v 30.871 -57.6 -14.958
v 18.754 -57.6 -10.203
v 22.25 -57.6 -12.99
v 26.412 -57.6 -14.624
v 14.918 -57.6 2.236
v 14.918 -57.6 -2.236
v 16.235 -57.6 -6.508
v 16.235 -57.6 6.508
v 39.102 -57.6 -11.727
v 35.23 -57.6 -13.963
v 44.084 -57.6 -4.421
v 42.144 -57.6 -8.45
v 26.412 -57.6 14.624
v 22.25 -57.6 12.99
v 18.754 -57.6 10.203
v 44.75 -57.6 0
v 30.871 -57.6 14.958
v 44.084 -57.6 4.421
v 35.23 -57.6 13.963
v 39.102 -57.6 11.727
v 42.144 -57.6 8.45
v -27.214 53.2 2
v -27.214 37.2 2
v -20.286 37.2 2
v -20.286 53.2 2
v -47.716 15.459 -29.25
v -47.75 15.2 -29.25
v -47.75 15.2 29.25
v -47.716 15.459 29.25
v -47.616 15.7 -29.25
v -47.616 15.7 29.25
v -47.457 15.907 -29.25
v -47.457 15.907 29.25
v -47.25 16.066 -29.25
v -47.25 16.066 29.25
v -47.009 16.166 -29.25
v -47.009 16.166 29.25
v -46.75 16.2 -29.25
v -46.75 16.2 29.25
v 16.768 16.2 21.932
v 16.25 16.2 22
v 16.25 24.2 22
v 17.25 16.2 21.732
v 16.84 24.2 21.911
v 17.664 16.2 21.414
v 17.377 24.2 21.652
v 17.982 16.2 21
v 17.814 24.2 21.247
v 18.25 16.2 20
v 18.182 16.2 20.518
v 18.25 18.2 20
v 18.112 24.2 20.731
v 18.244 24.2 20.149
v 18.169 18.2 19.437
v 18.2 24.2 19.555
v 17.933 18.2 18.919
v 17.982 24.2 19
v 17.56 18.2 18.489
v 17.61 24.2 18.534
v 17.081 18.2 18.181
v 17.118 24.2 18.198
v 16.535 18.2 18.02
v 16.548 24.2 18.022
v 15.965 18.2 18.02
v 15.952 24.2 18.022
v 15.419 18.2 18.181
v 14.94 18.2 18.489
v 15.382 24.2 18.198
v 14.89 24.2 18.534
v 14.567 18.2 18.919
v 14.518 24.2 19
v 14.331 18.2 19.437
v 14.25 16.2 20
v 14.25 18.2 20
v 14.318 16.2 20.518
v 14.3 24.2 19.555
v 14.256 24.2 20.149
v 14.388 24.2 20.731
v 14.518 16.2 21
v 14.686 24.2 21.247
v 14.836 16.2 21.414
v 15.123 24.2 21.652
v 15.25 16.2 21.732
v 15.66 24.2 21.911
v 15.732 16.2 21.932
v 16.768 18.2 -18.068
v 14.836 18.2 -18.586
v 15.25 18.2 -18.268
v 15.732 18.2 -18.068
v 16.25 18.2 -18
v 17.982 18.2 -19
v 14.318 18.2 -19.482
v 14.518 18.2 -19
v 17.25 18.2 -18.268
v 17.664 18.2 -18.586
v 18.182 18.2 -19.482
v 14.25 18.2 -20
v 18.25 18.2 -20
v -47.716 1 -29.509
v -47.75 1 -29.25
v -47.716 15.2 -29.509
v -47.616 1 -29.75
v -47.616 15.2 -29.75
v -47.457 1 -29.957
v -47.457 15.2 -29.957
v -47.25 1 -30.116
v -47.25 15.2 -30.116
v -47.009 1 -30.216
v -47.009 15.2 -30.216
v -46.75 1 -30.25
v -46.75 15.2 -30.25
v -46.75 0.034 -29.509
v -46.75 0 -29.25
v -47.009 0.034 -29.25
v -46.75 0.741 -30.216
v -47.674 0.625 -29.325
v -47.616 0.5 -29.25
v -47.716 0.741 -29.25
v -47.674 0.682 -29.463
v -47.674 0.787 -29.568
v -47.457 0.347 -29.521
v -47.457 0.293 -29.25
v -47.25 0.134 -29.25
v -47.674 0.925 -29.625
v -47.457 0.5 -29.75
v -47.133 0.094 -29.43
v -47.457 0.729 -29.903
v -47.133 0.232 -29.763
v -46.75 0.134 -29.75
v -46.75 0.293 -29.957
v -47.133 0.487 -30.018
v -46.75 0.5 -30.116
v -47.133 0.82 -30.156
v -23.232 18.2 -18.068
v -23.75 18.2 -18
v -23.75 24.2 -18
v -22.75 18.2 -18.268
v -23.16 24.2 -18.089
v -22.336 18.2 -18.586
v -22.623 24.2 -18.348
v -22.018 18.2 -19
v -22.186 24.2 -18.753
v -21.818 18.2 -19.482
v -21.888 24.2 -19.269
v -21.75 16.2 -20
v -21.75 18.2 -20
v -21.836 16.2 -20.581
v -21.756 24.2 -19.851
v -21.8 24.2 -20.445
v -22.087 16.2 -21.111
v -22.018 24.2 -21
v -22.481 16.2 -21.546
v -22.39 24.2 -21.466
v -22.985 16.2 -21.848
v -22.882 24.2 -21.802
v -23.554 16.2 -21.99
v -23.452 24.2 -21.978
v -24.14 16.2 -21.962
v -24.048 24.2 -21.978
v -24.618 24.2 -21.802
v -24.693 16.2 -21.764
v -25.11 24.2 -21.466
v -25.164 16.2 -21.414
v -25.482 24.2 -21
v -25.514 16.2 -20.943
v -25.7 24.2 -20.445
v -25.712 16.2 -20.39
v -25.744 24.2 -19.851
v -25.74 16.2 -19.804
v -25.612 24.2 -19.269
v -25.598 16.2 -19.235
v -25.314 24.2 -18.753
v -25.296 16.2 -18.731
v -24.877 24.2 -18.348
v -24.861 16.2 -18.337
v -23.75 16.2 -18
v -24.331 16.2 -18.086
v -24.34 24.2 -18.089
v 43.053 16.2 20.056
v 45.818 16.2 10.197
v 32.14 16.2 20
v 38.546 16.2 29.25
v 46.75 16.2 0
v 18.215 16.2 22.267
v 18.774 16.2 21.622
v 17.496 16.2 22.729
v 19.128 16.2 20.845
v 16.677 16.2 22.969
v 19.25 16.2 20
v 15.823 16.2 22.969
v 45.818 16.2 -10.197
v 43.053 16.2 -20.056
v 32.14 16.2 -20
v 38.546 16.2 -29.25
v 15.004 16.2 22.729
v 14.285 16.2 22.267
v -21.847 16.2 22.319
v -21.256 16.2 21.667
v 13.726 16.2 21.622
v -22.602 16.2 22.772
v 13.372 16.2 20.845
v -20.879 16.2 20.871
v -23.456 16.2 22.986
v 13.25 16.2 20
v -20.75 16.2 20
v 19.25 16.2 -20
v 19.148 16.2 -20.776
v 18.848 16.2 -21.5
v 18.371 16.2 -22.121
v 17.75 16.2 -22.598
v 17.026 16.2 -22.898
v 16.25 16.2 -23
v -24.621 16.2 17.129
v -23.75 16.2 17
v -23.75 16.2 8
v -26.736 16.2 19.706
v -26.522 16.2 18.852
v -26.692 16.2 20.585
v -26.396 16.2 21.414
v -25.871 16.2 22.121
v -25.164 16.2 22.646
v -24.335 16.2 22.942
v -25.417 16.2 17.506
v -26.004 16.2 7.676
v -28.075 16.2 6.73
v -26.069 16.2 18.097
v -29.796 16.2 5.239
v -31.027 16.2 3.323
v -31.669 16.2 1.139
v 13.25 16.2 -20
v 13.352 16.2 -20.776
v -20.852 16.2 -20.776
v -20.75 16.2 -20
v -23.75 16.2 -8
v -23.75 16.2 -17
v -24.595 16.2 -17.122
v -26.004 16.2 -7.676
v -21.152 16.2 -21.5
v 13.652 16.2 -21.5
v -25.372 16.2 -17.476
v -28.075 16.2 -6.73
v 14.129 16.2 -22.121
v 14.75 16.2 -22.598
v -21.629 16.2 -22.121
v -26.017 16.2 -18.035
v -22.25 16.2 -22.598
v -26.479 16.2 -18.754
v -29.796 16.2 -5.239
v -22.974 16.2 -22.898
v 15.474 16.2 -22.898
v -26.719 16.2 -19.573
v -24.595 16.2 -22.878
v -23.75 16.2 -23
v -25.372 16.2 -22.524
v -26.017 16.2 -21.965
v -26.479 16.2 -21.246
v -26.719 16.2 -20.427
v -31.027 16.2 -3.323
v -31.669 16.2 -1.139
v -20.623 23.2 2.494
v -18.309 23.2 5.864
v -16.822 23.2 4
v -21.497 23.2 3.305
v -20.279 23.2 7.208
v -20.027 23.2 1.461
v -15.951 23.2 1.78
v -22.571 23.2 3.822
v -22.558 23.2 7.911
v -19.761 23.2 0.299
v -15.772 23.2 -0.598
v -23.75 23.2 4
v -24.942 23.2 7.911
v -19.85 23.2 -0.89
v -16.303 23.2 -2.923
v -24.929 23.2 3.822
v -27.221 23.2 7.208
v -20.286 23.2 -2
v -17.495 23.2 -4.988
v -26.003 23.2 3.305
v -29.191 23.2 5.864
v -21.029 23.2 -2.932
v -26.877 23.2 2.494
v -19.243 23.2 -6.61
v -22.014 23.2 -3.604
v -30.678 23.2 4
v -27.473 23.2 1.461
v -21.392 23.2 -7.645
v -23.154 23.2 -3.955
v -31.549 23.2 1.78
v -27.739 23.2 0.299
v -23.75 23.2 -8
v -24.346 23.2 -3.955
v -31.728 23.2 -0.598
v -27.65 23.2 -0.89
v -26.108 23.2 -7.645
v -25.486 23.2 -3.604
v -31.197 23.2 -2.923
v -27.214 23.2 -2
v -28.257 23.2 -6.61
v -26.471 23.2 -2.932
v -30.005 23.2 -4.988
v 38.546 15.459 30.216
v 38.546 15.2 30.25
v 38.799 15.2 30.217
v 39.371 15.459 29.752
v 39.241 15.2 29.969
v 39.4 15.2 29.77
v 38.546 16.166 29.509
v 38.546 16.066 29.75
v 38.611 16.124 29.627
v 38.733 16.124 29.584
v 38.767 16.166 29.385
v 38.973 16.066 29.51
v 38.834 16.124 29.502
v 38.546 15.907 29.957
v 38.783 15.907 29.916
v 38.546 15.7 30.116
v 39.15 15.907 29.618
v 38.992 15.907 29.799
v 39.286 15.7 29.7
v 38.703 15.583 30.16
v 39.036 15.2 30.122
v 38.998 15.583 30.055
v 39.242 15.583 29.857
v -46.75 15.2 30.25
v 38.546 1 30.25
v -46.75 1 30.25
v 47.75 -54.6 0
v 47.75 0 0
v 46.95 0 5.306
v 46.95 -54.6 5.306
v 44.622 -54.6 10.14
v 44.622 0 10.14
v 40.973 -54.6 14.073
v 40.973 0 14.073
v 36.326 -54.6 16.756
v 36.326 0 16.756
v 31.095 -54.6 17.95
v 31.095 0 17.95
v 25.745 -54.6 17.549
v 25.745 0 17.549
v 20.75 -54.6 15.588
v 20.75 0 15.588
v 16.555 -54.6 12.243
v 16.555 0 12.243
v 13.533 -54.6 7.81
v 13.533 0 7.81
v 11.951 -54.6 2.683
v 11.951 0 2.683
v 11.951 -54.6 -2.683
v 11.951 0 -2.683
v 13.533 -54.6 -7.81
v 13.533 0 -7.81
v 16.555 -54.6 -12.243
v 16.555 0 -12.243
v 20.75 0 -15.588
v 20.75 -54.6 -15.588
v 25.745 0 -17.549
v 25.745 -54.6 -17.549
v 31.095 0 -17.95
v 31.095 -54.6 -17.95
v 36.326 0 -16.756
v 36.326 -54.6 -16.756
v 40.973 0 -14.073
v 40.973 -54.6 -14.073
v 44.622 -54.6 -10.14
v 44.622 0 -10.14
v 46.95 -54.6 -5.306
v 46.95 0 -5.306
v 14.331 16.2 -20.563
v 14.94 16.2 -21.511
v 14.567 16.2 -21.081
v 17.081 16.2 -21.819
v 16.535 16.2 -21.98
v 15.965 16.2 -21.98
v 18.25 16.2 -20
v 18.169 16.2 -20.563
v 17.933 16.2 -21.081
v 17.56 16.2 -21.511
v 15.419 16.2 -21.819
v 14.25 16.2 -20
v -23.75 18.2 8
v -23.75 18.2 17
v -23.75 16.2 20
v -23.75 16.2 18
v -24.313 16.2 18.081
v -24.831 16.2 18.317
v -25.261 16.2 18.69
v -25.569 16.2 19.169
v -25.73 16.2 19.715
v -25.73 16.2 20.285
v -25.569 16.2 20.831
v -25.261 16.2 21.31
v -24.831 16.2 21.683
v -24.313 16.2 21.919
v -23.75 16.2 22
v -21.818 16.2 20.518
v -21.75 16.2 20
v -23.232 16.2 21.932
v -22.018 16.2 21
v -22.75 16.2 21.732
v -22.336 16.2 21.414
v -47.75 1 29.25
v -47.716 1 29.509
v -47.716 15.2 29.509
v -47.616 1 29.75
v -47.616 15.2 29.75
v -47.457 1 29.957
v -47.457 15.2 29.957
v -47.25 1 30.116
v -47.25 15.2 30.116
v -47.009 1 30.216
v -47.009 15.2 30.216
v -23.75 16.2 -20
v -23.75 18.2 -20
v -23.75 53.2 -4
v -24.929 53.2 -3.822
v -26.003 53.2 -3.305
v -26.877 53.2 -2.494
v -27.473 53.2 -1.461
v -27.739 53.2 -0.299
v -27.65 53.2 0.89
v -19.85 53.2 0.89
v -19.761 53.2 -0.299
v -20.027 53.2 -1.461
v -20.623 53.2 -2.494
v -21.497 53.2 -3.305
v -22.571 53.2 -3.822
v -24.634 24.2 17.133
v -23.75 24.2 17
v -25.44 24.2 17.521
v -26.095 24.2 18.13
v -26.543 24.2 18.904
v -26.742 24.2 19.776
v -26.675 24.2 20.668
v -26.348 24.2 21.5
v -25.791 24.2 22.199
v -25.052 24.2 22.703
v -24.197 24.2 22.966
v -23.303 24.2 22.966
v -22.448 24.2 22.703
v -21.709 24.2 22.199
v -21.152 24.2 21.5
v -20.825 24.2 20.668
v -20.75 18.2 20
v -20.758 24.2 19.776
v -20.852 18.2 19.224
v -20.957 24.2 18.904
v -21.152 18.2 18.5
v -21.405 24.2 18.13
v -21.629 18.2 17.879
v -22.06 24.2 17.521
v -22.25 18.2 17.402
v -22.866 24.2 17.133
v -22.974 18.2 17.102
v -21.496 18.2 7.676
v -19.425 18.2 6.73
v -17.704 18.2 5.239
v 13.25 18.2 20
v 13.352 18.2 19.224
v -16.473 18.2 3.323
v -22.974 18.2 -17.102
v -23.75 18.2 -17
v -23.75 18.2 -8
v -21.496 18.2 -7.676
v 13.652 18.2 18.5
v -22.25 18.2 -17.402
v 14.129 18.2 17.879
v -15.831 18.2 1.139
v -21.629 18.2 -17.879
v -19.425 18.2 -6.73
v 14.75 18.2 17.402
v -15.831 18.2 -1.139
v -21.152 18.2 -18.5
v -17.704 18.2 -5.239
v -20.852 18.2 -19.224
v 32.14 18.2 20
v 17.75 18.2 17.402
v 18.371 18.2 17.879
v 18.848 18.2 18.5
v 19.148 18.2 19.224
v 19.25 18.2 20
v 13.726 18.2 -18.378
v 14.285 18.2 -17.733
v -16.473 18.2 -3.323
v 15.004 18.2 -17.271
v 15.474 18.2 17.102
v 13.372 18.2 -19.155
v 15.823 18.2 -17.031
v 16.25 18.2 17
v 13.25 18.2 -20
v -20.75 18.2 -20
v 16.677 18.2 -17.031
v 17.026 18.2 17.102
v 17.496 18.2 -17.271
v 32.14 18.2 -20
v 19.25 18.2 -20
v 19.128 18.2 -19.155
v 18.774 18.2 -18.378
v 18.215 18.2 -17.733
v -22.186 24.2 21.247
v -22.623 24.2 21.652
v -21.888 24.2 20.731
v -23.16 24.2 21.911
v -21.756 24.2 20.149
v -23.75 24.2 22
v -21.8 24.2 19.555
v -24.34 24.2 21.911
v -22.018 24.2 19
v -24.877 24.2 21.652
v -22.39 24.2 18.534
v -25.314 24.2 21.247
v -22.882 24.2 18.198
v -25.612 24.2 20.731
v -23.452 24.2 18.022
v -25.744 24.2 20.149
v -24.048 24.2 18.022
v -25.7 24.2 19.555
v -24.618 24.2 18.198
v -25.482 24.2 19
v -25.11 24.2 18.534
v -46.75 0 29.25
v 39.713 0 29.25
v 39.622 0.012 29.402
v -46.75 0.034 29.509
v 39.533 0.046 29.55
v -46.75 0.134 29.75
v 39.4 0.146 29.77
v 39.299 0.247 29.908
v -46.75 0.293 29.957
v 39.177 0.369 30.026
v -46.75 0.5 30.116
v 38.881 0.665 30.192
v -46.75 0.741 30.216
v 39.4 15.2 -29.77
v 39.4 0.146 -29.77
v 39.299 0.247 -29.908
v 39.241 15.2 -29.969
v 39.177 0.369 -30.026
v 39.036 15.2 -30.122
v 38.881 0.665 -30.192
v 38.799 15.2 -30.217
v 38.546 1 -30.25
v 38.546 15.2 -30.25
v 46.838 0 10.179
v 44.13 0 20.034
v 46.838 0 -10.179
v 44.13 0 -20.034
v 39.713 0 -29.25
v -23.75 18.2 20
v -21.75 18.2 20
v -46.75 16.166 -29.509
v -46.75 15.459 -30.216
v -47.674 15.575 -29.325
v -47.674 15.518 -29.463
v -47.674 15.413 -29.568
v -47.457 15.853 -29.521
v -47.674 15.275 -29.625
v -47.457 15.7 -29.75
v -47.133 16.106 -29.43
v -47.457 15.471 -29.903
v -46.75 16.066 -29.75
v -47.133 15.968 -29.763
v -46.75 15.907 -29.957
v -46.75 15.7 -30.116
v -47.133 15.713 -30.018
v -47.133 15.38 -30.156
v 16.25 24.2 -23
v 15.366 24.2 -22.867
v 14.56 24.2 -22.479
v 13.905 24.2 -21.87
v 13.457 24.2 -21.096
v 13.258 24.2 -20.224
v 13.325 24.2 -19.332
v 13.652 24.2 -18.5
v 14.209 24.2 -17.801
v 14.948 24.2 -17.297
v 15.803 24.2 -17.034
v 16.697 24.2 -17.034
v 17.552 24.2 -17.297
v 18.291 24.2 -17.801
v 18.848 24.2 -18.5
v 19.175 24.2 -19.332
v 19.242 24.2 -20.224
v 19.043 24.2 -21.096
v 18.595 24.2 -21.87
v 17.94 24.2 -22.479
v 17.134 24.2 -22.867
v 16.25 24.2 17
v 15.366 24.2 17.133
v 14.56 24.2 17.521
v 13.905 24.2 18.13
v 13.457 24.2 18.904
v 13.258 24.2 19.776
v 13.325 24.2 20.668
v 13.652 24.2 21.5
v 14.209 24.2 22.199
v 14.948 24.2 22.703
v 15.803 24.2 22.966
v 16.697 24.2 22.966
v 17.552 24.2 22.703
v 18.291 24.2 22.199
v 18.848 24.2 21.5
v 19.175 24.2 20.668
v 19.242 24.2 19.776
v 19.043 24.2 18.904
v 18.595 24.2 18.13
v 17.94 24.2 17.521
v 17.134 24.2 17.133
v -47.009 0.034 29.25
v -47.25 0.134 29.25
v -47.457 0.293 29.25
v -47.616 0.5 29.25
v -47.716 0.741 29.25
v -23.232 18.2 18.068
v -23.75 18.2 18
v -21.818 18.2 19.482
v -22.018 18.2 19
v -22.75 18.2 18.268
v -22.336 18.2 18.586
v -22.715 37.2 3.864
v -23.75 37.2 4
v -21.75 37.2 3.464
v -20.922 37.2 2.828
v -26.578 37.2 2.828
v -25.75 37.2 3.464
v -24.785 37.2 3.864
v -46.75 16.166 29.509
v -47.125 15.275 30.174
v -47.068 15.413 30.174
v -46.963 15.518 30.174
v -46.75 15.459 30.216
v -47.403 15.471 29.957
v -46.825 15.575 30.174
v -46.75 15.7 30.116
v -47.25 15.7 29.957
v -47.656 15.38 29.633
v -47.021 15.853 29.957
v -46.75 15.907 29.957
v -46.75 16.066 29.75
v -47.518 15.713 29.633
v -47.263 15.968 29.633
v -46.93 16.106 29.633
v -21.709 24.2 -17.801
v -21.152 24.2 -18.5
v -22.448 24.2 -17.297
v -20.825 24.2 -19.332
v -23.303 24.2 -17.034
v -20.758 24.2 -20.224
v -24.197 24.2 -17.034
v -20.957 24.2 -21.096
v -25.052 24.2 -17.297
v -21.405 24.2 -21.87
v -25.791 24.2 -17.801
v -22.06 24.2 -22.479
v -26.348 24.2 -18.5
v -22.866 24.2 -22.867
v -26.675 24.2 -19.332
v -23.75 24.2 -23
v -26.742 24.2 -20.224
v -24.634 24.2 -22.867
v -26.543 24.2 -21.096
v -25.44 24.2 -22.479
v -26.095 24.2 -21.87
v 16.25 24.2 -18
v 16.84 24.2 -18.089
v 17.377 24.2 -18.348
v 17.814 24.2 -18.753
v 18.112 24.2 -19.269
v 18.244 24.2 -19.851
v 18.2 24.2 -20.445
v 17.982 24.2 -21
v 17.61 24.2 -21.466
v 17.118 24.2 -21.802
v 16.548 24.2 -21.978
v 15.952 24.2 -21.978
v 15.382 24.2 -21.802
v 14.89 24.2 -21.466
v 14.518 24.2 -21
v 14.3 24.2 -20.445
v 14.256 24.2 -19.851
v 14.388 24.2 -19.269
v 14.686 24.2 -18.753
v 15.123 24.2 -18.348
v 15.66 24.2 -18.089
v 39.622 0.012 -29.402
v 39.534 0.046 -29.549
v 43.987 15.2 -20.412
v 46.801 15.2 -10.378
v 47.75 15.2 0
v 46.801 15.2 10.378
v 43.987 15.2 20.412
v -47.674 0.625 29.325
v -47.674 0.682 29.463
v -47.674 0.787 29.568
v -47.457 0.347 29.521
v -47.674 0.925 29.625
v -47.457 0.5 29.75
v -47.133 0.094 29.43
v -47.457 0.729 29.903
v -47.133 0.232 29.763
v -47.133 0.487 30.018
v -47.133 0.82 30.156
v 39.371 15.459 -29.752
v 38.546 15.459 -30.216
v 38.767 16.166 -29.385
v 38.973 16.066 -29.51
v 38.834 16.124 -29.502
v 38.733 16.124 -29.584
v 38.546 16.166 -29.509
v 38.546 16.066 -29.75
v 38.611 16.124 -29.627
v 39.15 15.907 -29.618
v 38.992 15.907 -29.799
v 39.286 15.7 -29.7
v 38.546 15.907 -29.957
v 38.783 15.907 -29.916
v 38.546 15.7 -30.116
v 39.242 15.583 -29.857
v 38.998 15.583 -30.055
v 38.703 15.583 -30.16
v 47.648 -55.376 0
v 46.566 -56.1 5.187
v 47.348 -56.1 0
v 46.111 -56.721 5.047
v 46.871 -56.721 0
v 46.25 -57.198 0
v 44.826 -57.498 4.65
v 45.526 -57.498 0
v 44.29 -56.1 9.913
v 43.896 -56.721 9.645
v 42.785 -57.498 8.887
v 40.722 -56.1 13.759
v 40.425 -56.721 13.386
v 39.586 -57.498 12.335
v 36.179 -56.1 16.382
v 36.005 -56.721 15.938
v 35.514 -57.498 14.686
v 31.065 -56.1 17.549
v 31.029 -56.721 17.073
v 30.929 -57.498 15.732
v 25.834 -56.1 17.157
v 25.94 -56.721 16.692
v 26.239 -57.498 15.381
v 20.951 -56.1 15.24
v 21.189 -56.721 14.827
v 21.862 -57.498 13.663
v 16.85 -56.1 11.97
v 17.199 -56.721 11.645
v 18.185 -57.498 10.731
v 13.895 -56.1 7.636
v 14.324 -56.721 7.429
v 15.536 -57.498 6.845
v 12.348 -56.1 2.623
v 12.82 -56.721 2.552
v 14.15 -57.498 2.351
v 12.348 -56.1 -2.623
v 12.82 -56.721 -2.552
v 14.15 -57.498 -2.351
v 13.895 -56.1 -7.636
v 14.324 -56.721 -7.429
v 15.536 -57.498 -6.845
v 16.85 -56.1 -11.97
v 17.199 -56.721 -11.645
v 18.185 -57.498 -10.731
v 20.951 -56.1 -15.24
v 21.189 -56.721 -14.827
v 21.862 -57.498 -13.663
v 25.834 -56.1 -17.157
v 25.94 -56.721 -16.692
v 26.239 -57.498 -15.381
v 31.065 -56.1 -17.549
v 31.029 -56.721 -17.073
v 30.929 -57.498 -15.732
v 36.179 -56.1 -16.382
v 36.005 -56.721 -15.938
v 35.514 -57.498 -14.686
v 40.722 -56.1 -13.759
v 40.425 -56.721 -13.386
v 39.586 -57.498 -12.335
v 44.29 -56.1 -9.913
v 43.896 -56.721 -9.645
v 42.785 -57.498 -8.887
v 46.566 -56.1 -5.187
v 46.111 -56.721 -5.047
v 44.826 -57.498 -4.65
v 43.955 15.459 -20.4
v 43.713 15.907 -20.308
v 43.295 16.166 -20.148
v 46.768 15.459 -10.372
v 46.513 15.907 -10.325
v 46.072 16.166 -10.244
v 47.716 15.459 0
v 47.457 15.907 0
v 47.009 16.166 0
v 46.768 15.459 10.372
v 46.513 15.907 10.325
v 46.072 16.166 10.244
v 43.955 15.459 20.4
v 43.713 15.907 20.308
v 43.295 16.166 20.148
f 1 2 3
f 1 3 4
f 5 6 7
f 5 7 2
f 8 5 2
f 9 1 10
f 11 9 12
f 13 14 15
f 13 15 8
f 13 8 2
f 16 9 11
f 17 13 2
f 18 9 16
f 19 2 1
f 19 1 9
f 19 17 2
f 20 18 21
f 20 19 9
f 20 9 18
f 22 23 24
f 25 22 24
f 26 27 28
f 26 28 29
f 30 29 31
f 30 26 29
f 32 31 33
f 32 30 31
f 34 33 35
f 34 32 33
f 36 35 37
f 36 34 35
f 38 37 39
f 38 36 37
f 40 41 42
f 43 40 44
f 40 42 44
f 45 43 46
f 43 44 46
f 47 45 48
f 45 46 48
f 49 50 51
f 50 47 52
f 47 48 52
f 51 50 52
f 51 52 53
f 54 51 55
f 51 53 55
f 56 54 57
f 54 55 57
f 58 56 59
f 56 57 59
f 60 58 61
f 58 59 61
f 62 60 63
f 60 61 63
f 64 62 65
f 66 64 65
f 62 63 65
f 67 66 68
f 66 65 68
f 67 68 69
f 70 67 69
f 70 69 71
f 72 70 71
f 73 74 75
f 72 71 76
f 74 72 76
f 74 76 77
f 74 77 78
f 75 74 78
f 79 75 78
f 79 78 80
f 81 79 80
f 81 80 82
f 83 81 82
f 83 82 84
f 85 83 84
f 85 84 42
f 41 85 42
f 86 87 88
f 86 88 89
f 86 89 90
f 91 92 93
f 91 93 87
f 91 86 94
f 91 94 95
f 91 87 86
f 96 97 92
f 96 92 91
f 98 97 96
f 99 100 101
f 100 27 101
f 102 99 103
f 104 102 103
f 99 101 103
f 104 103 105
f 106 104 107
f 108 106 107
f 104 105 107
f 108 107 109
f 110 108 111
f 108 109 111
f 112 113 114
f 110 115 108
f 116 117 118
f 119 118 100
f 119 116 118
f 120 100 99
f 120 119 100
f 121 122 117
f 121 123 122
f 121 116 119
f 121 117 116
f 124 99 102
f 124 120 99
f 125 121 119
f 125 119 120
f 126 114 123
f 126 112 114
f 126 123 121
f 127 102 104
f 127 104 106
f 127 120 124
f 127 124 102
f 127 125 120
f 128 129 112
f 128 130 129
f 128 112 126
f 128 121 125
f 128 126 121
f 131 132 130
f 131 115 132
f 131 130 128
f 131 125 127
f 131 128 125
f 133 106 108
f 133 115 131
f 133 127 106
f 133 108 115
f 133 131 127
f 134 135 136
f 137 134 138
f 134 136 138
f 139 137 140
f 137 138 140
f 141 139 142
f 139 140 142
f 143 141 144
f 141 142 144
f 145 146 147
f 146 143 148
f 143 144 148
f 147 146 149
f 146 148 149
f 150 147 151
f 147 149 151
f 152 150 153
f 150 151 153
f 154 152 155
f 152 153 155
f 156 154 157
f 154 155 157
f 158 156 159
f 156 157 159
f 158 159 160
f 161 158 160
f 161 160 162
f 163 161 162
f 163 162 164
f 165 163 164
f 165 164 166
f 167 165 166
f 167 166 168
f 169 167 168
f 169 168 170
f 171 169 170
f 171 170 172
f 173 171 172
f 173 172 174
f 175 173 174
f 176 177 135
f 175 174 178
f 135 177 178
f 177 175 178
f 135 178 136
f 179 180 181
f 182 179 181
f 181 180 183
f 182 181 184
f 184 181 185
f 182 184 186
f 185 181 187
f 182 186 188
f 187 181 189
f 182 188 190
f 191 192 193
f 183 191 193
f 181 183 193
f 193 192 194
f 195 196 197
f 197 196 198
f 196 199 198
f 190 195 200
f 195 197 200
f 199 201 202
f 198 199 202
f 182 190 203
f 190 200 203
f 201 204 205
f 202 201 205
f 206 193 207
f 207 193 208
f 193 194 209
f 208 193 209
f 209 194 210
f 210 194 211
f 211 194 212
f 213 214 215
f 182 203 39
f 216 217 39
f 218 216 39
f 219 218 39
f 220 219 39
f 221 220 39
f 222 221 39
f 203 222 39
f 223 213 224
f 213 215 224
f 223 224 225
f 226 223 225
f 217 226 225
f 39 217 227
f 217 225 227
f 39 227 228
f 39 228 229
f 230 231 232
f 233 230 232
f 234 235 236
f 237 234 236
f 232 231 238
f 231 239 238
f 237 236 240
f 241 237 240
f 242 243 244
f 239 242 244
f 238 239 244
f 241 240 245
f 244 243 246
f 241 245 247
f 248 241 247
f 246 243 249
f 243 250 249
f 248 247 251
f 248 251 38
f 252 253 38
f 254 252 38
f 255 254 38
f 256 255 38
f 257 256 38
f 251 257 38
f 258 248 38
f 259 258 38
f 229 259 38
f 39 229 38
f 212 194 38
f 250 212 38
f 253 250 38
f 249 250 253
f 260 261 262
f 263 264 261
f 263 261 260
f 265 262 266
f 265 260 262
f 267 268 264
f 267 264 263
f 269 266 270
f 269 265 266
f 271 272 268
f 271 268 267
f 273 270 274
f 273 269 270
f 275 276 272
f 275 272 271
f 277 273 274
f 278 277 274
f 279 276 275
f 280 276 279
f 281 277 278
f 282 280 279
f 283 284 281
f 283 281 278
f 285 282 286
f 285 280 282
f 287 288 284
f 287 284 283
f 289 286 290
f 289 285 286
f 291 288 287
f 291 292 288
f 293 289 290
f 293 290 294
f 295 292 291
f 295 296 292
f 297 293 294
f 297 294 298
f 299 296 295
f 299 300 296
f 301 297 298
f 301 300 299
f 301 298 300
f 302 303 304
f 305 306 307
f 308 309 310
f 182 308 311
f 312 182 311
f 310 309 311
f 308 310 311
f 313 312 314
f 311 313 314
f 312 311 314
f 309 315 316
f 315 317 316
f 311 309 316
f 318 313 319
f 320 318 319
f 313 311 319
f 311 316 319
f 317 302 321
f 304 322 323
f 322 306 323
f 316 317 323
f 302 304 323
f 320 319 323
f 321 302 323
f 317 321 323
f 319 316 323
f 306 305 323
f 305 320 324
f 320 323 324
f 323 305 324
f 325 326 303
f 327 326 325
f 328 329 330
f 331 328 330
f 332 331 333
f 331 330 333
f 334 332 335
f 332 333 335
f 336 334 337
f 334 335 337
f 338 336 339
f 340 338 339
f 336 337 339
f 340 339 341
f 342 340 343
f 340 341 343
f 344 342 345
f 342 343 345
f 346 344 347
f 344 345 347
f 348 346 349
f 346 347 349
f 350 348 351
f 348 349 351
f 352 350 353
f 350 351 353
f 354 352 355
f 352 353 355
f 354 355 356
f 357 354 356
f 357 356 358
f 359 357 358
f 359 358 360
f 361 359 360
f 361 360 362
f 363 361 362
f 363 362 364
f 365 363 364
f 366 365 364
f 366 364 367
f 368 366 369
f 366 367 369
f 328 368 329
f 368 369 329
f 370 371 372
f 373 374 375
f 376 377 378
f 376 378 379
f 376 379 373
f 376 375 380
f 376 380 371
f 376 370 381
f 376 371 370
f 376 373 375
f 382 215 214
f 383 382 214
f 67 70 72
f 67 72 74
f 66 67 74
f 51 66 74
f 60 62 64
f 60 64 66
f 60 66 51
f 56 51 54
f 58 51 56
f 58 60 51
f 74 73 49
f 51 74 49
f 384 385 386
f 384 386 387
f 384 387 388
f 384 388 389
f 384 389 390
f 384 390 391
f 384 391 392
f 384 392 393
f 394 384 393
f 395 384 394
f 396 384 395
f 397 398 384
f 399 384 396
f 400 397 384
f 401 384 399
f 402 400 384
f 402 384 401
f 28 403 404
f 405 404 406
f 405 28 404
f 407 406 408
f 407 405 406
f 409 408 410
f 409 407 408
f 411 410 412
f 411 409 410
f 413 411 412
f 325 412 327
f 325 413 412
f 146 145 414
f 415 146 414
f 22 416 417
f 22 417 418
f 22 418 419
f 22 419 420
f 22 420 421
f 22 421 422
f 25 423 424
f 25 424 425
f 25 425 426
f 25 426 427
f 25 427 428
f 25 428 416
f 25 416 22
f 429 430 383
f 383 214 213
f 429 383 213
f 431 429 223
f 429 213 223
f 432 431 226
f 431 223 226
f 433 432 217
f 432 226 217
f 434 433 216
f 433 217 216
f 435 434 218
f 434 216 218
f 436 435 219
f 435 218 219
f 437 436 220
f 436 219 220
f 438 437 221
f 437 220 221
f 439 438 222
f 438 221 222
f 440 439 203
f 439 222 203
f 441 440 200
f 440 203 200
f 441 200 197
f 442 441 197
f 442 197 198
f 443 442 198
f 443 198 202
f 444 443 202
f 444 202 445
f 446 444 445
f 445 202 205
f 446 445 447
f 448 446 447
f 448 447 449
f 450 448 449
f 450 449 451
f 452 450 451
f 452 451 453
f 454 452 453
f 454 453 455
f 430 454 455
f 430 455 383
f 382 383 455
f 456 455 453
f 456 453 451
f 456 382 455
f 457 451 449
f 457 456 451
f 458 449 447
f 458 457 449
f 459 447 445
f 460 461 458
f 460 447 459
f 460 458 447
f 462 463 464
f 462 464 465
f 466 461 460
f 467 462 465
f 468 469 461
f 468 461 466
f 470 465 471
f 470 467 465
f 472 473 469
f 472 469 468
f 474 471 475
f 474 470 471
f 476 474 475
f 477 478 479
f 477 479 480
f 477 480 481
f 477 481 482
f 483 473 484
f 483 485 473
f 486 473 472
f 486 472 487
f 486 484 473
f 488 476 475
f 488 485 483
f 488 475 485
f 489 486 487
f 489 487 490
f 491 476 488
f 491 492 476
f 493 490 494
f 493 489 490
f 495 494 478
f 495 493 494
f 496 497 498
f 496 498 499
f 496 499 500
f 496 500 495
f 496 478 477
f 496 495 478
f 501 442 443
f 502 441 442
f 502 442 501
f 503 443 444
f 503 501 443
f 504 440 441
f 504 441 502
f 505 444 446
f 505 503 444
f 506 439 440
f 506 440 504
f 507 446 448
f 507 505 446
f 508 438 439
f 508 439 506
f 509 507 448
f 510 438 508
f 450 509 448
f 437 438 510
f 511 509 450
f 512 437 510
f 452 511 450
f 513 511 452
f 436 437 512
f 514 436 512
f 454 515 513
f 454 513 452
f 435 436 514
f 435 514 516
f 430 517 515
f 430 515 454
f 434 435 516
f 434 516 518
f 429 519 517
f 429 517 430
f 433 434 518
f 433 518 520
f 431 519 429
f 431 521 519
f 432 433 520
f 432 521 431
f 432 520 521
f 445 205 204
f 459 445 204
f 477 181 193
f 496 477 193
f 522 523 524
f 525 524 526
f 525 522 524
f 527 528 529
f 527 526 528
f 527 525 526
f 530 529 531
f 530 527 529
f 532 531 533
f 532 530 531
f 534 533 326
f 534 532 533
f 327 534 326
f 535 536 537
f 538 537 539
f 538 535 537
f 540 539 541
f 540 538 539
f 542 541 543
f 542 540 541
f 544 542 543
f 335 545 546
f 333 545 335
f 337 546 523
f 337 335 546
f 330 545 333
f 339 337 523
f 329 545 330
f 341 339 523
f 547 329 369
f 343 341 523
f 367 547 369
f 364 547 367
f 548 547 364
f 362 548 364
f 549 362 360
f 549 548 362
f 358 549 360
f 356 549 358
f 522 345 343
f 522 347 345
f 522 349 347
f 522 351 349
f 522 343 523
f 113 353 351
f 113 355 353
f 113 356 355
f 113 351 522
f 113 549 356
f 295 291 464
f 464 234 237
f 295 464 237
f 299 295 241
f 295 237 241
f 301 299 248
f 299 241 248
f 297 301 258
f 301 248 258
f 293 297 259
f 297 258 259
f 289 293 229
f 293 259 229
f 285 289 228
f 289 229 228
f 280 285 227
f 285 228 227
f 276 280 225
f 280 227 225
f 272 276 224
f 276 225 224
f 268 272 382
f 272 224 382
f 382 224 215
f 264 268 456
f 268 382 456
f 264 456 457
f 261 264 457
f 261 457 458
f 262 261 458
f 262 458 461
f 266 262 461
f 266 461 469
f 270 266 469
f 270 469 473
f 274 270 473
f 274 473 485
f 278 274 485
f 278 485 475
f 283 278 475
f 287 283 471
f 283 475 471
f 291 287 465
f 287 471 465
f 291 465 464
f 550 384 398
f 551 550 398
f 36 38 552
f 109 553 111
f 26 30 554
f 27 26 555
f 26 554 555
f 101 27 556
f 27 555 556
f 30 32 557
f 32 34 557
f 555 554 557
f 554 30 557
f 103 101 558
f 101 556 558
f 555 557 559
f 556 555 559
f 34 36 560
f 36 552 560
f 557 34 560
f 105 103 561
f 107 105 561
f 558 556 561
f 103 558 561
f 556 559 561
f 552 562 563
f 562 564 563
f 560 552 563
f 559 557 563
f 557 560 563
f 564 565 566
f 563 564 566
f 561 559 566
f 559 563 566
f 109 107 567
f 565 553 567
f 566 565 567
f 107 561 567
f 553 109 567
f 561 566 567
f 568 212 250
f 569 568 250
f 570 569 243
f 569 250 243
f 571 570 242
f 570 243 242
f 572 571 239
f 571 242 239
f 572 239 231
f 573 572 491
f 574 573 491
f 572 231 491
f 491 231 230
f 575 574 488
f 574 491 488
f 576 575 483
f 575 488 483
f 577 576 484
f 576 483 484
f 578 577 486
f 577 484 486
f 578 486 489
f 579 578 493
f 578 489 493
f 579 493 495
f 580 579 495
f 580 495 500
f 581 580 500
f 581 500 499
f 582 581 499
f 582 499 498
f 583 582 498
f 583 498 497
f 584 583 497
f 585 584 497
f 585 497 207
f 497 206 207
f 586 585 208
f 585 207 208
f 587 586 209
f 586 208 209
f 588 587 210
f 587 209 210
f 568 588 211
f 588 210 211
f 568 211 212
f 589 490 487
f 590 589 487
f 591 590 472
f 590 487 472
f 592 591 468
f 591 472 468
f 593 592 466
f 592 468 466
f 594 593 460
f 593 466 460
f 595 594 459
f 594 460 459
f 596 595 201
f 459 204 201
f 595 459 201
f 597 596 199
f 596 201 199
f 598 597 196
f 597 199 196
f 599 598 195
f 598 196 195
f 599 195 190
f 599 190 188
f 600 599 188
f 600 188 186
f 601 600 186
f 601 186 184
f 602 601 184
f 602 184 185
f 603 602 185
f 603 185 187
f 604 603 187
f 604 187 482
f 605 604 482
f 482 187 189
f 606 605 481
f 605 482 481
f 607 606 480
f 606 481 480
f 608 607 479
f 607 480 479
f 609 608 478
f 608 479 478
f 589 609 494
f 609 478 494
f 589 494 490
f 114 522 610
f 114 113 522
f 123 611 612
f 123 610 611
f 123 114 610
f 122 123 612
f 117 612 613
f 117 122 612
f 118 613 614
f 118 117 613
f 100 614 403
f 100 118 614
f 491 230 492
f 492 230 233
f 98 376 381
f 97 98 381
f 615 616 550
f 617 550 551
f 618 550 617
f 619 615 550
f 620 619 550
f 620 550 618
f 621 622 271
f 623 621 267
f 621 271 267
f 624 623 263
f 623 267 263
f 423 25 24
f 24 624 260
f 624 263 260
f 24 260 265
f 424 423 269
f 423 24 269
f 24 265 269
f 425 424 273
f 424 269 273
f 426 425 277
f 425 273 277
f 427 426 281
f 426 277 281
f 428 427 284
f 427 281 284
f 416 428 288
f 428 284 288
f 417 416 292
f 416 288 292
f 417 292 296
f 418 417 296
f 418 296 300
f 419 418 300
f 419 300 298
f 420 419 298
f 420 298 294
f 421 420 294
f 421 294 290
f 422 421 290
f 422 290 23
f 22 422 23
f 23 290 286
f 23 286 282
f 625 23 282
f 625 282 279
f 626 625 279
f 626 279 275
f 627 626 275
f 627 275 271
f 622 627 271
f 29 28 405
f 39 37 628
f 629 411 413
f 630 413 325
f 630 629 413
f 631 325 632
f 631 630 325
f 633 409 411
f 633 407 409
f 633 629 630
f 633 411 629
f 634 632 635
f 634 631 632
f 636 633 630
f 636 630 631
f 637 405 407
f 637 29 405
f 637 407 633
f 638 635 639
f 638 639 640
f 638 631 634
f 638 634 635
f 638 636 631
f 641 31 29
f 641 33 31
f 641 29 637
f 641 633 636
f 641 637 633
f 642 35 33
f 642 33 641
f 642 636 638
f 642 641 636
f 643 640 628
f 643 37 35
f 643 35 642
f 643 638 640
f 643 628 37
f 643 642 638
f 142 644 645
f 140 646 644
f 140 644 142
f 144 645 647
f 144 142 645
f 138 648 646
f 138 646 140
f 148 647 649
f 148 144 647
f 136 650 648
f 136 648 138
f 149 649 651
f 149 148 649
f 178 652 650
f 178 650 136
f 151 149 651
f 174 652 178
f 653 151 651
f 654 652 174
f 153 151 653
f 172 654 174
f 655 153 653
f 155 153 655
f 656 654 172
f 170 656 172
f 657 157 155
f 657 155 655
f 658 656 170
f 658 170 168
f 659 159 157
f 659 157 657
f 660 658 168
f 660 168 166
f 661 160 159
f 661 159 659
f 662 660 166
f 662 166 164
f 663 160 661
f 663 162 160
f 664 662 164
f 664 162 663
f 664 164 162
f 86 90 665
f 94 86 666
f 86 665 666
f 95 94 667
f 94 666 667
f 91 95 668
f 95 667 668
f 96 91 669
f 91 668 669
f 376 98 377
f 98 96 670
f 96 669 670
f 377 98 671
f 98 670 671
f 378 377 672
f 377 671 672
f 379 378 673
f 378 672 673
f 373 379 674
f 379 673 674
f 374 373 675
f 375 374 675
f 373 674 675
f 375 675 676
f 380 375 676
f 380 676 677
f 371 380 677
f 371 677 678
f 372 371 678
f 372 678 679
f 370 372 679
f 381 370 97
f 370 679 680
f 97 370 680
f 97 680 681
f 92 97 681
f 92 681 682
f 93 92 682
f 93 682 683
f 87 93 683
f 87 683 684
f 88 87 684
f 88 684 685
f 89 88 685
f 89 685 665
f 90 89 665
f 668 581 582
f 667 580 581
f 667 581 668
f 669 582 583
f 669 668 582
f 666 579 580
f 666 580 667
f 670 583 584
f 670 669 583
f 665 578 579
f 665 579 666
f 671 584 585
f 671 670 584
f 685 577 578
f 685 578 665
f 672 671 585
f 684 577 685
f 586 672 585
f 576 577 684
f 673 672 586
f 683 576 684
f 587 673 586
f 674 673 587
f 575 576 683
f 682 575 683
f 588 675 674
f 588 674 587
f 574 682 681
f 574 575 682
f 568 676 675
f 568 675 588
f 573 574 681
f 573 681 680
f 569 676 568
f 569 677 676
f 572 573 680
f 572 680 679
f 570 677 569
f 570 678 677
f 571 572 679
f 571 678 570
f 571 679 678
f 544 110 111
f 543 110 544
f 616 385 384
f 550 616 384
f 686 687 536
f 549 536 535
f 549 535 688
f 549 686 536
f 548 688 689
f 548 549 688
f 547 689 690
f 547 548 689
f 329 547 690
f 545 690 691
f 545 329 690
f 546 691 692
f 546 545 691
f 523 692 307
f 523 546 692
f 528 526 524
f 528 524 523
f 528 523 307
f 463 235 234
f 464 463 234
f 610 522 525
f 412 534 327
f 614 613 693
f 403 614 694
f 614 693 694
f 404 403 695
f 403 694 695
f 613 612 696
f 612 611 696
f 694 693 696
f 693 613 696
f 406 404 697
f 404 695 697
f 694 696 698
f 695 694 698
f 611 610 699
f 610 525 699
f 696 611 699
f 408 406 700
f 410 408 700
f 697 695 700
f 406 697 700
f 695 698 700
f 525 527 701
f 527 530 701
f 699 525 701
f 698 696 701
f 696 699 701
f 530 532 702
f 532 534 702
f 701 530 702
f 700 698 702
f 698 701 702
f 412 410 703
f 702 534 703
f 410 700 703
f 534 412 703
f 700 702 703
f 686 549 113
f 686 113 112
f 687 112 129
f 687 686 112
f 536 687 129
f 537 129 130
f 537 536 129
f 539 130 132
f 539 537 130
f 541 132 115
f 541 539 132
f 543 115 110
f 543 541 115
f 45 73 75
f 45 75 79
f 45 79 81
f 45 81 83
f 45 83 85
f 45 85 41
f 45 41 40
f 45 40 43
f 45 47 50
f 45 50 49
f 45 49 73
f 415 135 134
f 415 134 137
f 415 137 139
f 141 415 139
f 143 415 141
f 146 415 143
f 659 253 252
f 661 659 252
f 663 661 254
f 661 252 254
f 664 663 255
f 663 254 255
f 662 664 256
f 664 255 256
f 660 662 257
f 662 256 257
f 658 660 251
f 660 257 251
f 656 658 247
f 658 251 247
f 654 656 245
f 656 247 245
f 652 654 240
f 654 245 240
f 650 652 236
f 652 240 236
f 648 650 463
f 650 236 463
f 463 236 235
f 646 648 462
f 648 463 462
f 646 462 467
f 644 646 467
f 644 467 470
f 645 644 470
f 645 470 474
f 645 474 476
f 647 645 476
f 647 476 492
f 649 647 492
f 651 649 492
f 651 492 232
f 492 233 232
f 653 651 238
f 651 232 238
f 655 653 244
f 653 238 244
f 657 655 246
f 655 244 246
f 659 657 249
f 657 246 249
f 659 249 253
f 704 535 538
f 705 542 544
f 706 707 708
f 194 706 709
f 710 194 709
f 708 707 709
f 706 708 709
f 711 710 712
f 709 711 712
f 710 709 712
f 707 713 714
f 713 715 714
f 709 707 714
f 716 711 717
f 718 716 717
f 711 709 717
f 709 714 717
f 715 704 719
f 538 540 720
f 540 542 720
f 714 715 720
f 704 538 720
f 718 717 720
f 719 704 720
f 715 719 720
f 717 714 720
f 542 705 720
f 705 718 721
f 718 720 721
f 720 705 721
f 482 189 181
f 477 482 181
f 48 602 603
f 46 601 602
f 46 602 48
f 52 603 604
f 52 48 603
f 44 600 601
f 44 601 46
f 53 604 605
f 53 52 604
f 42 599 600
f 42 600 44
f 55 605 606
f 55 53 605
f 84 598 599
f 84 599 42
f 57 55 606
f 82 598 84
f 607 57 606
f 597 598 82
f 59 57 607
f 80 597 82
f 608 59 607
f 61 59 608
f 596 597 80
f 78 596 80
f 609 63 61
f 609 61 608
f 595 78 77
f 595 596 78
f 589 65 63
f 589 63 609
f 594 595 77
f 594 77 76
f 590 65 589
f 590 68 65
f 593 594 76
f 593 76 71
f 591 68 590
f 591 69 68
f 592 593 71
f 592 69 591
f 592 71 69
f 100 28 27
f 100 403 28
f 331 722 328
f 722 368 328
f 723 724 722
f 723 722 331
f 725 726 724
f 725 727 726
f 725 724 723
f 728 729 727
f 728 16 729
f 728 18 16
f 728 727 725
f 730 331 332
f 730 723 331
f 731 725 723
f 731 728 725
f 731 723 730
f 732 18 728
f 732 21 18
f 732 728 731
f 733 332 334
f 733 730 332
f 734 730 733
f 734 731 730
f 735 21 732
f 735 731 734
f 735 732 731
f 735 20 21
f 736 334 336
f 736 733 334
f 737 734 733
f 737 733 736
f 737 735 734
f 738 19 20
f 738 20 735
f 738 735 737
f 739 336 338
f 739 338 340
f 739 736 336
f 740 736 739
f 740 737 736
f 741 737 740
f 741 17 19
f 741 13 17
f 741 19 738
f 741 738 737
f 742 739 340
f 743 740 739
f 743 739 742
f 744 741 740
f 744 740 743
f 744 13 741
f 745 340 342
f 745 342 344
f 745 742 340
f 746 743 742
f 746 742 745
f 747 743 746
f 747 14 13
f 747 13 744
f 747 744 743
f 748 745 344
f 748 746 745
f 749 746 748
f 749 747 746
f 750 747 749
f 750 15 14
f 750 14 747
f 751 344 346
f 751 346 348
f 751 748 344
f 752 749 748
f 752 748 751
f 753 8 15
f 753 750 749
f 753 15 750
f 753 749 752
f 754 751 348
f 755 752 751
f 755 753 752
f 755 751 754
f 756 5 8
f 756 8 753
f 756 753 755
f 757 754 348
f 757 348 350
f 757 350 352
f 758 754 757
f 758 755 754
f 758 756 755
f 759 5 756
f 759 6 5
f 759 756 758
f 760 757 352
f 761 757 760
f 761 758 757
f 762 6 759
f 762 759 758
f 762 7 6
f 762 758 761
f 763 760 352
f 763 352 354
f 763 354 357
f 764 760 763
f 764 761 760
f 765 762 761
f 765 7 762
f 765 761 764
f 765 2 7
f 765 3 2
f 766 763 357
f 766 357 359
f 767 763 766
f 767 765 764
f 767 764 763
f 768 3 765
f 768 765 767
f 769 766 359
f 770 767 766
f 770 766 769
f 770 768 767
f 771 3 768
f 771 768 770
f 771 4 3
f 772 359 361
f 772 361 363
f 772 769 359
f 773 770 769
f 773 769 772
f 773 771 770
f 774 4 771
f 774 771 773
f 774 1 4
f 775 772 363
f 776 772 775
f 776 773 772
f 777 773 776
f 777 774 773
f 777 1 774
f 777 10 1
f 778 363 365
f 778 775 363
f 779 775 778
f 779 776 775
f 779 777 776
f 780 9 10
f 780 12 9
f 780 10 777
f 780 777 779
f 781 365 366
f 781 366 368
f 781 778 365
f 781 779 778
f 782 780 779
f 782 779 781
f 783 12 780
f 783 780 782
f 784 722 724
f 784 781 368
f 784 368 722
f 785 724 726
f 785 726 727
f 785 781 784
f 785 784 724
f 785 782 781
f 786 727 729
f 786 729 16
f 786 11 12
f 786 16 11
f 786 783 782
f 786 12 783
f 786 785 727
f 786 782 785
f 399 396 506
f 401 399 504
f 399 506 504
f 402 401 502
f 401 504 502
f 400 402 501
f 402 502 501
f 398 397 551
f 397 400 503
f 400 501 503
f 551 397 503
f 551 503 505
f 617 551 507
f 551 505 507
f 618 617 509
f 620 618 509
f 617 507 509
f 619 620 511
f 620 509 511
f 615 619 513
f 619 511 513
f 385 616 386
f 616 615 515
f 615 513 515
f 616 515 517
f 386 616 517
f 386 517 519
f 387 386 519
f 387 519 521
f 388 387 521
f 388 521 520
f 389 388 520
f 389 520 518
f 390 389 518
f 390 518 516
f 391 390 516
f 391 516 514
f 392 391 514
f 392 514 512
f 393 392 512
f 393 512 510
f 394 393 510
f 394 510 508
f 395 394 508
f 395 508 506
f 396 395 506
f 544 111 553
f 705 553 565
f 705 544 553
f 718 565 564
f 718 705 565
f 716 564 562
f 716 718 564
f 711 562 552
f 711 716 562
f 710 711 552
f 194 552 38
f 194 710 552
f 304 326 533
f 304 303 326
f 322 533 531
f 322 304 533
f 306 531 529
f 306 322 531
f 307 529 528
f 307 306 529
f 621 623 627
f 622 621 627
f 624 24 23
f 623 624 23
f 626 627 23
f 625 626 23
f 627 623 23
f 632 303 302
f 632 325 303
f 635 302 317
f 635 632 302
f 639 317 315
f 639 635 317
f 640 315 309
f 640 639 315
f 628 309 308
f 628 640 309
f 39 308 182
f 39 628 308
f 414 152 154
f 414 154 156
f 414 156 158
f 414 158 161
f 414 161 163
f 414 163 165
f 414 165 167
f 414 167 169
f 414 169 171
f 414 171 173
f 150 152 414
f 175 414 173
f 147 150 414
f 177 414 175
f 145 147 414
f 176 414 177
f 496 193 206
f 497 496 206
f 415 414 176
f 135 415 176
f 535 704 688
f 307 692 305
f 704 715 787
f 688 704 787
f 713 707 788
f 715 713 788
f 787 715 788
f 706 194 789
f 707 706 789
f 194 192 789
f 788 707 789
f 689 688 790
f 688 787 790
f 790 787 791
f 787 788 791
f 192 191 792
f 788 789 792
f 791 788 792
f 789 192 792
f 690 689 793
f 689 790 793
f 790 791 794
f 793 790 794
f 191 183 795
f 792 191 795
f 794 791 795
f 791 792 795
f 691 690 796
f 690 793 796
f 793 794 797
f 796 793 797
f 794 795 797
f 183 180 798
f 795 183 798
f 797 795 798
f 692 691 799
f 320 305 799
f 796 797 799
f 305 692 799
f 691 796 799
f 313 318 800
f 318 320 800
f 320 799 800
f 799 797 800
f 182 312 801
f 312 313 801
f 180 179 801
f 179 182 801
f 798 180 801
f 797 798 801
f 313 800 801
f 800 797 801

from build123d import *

# Parameters (mm, degrees)
EXTRUDE_1_DEPTH     = 16.2
SKETCH_2_R          = 3
EXTRUDE_2_DEPTH     = 8
SKETCH_3_R          = 2
CUT_EXTRUDE_1_DEPTH = 8
SKETCH_4_R          = 8
EXTRUDE_3_DEPTH     = 7
SKETCH_5_R          = 4
EXTRUDE_4_DEPTH     = 30
CUT_EXTRUDE_START   = -16
CUT_EXTRUDE_2_DEPTH = 16
EXTRUDE_5_DEPTH     = 2
SKETCH_9_R          = 18
EXTRUDE_6_DEPTH     = 57.6
FILLET_1_R          = 3
FILLET_2_R          = 1


with BuildPart() as part:
    # 草图1 → 凸台-拉伸1 (new body)
    with BuildSketch(Plane(origin=(0, 0, 0), x_dir=(1, 0, 0), z_dir=(0, 1, 0))):
        with BuildLine():
            Line((-47.75, 30.25), (39.104556615, 30.25))
            ThreePointArc((39.104556615, 30.25), (47.75, 0), (39.104556615, -30.25))
            Line((39.104556615, -30.25), (-47.75, -30.25))
            Line((-47.75, -30.25), (-47.75, 30.25))
        make_face()
    extrude(amount=EXTRUDE_1_DEPTH)

    # 草图2 → 凸台-拉伸2 (add)
    with BuildSketch(Plane(origin=(0, 16.2, 0), x_dir=(1, 0, 0), z_dir=(0, 1, 0))):
        with Locations(Location((-23.75, -20, 0), (0, 0, 90))):
            Circle(SKETCH_2_R)
        with Locations(Location((16.25, -20, 0), (0, 0, 90))):
            Circle(SKETCH_2_R)
        with Locations(Location((16.25, 20, 0), (0, 0, 90))):
            Circle(SKETCH_2_R)
        with Locations(Location((-23.75, 20, 0), (0, 0, 90))):
            Circle(SKETCH_2_R)
    extrude(amount=EXTRUDE_2_DEPTH)

    # 草图3 → 切除-拉伸1 (cut)
    with BuildSketch(Plane(origin=(0, 24.2, 0), x_dir=(1, 0, 0), z_dir=(0, 1, 0))):
        with Locations(Location((-23.75, -20, 0), (0, 0, 270))):
            Circle(SKETCH_3_R)
        with Locations(Location((16.25, -20, 0), (0, 0, 270))):
            Circle(SKETCH_3_R)
        with Locations(Location((16.25, 20, 0), (0, 0, 270))):
            Circle(SKETCH_3_R)
        with Locations(Location((-23.75, 20, 0), (0, 0, 270))):
            Circle(SKETCH_3_R)
    extrude(amount=-CUT_EXTRUDE_1_DEPTH, mode=Mode.SUBTRACT)

    # 草图4 → 凸台-拉伸3 (add)
    with BuildSketch(Plane(origin=(0, 16.2, 0), x_dir=(1, 0, 0), z_dir=(0, 1, 0))):
        with Locations(Location((-23.75, 0, 0), (0, 0, 90))):
            Circle(SKETCH_4_R)
    extrude(amount=EXTRUDE_3_DEPTH)

    # 草图5 → 凸台-拉伸4 (add)
    with BuildSketch(Plane(origin=(0, 23.2, 0), x_dir=(1, 0, 0), z_dir=(0, 1, 0))):
        with Locations(Location((-23.75, 0, 0), (0, 0, 270))):
            Circle(SKETCH_5_R)
    extrude(amount=EXTRUDE_4_DEPTH)

    # 草图6 → 切除-拉伸2 (cut)
    with BuildSketch(Plane(origin=(0, 53.2, 0), x_dir=(1, 0, 0), z_dir=(0, 1, 0)).offset(CUT_EXTRUDE_START)):
        with BuildLine():
            Line((-27.214101615, -2), (-20.285898385, -2))
            ThreePointArc((-20.285898385, -2), (-23.75, -4), (-27.214101615, -2))
        make_face()
    extrude(amount=CUT_EXTRUDE_2_DEPTH, mode=Mode.SUBTRACT)

    # 草图7 → 凸台-拉伸5 (add)
    with BuildSketch(Plane(origin=(0, 16.2, 0), x_dir=(1, 0, 0), z_dir=(0, 1, 0))):
        Polygon((-23.75, -20), (16.25, -20), (32.139613293, -20), (32.139613293, 20), (16.25, 20), (-23.75, 20), align=None)
    extrude(amount=EXTRUDE_5_DEPTH)

    # 草图9 → 凸台-拉伸6 (add)
    with BuildSketch(Plane.XZ):
        with Locations((29.75, 0)):
            Circle(SKETCH_9_R)
    extrude(amount=EXTRUDE_6_DEPTH)

    # 圆角1
    fillet_1_edges = [part.edges().sort_by_distance(p)[0] for p in [
        (11.75, -57.6, 0),
    ]]
    fillet(fillet_1_edges, radius=FILLET_1_R)

    # 圆角2
    fillet_2_edges = [part.edges().sort_by_distance(p)[0] for p in [
        (47.75, 16.2, 0),
        (-4.322721692, 16.2, -30.25),
        (-47.75, 16.2, 0),
        (-4.322721692, 0, -30.25),
        (-4.322721692, 0, 30.25),
        (-47.75, 0, 0),
        (-47.75, 8.1, -30.25),
        (39.104556615, 8.1, -30.25),
        (39.104556615, 8.1, 30.25),
        (-47.75, 8.1, 30.25),
        (-4.322721692, 16.2, 30.25),
    ]]
    fillet(fillet_2_edges, radius=FILLET_2_R)


solid = part.part
